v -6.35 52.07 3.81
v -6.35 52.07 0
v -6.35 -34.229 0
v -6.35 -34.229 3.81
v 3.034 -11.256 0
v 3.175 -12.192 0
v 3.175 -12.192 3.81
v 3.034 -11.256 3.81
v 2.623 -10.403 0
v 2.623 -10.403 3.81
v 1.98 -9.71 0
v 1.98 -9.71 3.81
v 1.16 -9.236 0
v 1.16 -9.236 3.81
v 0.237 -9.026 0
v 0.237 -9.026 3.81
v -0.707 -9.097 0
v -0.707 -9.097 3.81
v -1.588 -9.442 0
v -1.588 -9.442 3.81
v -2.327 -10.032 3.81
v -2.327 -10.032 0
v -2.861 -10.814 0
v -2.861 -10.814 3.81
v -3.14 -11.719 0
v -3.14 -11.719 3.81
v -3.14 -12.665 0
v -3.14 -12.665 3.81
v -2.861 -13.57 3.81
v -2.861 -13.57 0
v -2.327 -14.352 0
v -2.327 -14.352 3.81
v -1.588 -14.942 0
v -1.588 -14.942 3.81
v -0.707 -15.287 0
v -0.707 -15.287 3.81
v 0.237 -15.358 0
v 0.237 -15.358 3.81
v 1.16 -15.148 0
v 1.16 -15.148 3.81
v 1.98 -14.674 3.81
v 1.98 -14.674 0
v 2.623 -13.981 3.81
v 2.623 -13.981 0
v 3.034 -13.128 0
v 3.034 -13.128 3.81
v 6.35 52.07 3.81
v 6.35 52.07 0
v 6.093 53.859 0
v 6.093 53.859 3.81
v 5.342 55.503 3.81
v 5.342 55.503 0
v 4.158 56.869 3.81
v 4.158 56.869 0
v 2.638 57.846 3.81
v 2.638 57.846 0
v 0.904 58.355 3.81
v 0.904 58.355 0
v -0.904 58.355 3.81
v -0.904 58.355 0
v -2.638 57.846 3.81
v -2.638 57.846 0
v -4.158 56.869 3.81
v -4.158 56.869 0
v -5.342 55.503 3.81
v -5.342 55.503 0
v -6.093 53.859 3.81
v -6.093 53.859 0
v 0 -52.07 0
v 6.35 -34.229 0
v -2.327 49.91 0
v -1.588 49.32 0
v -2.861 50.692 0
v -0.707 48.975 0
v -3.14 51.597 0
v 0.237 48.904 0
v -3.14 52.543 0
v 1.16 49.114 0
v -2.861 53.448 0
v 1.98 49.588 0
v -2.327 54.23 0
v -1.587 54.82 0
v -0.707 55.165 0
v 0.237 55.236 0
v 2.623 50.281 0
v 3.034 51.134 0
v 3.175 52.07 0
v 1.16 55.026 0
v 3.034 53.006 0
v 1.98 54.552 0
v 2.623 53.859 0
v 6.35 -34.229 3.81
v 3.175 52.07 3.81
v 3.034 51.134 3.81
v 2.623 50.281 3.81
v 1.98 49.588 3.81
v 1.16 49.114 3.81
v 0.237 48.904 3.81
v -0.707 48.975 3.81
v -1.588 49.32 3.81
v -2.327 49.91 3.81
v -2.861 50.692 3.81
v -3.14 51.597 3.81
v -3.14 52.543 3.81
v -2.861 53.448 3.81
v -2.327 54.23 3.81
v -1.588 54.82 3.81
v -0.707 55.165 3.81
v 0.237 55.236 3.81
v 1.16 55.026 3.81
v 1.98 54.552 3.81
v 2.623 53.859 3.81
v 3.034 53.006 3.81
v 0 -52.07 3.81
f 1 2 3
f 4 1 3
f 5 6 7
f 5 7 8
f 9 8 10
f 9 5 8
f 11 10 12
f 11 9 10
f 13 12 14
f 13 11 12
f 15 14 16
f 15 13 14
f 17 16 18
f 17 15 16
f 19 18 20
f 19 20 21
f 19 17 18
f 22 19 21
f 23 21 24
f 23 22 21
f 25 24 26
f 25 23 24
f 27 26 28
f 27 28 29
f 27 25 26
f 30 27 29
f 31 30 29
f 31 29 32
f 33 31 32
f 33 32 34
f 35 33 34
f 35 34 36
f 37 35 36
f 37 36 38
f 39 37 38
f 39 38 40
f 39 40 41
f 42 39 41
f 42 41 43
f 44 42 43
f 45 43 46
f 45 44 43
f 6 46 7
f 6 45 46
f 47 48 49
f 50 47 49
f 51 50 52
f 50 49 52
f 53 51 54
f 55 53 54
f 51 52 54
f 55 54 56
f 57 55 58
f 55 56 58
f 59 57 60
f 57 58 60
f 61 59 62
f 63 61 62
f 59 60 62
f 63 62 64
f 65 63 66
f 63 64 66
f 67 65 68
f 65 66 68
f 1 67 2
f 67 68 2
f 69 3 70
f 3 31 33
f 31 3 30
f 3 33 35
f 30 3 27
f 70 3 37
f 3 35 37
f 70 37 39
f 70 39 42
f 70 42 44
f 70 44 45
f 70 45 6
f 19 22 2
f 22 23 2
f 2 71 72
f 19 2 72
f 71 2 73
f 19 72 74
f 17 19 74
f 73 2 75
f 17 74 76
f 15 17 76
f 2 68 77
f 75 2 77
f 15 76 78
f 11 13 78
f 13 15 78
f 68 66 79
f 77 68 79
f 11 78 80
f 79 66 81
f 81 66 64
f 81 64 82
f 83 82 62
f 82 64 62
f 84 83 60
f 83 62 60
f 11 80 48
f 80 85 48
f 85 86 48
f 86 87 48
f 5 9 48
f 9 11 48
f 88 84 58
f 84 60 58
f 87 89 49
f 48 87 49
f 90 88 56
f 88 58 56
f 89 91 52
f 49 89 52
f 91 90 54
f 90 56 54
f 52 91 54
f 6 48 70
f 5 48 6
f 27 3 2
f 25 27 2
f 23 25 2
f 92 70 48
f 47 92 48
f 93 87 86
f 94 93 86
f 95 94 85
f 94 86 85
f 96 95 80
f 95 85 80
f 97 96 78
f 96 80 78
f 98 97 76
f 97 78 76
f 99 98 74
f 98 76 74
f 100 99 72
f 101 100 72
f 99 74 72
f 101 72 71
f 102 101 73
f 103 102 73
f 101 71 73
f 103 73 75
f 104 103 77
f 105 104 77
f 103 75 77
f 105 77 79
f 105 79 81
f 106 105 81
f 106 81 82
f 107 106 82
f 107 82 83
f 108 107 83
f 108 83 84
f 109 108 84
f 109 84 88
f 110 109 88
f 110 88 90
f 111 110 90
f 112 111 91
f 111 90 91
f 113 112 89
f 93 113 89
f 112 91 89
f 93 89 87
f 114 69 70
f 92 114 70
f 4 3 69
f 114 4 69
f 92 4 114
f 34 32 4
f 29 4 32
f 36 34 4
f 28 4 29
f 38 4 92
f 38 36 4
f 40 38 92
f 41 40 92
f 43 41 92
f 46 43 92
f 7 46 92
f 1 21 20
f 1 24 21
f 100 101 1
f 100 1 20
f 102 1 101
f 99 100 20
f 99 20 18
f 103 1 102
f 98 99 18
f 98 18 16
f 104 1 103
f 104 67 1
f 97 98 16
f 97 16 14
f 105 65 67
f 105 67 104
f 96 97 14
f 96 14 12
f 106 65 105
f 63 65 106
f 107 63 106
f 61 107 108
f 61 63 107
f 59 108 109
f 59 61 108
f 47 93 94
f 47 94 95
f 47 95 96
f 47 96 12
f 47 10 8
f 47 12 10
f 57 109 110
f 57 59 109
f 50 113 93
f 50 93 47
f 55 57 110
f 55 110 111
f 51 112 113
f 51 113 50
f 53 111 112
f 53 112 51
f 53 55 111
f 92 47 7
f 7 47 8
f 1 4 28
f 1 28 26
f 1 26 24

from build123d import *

# Parameters (mm, degrees)
F1_DEPTH = 3.81
F0_R     = 3.175
F2_DEPTH = 3.81


# Not quite as in the source:
# - a feature names something its author has since deleted; it is built from what else it names


with BuildPart() as f1:
    # F0 (on Top) → F1 (new body)
    with BuildSketch(Plane.XY):
        with BuildLine():
            ThreePointArc((-3.175, 52.07), (0, 55.245), (3.175, 52.07))
            Line((3.175, 52.07), (6.35, 52.07))
            ThreePointArc((6.35, 52.07), (0, 58.42), (-6.35, 52.07))
            Line((-6.35, 52.07), (-3.175, 52.07))
        make_face()
    extrude(amount=F1_DEPTH)

    # F0 (on Top) → F2 (join)
    with BuildSketch(Plane.XY):
        Polygon((0, -52.07), (6.35, -34.2291146517), (-6.35, -34.2291146517), align=None)
        with BuildLine():
            Line((6.35, 52.07), (3.175, 52.07))
            ThreePointArc((3.175, 52.07), (0, 48.895), (-3.175, 52.07))
            Line((-3.175, 52.07), (-6.35, 52.07))
            Line((-6.35, 52.07), (-6.35, -34.2291146517))
            Line((-6.35, -34.2291146517), (6.35, -34.2291146517))
            Line((6.35, -34.2291146517), (6.35, 52.07))
        make_face()
        with Locations((0, -12.192)):
            Circle(F0_R, mode=Mode.SUBTRACT)
    extrude(amount=F2_DEPTH)


solid = f1.part
